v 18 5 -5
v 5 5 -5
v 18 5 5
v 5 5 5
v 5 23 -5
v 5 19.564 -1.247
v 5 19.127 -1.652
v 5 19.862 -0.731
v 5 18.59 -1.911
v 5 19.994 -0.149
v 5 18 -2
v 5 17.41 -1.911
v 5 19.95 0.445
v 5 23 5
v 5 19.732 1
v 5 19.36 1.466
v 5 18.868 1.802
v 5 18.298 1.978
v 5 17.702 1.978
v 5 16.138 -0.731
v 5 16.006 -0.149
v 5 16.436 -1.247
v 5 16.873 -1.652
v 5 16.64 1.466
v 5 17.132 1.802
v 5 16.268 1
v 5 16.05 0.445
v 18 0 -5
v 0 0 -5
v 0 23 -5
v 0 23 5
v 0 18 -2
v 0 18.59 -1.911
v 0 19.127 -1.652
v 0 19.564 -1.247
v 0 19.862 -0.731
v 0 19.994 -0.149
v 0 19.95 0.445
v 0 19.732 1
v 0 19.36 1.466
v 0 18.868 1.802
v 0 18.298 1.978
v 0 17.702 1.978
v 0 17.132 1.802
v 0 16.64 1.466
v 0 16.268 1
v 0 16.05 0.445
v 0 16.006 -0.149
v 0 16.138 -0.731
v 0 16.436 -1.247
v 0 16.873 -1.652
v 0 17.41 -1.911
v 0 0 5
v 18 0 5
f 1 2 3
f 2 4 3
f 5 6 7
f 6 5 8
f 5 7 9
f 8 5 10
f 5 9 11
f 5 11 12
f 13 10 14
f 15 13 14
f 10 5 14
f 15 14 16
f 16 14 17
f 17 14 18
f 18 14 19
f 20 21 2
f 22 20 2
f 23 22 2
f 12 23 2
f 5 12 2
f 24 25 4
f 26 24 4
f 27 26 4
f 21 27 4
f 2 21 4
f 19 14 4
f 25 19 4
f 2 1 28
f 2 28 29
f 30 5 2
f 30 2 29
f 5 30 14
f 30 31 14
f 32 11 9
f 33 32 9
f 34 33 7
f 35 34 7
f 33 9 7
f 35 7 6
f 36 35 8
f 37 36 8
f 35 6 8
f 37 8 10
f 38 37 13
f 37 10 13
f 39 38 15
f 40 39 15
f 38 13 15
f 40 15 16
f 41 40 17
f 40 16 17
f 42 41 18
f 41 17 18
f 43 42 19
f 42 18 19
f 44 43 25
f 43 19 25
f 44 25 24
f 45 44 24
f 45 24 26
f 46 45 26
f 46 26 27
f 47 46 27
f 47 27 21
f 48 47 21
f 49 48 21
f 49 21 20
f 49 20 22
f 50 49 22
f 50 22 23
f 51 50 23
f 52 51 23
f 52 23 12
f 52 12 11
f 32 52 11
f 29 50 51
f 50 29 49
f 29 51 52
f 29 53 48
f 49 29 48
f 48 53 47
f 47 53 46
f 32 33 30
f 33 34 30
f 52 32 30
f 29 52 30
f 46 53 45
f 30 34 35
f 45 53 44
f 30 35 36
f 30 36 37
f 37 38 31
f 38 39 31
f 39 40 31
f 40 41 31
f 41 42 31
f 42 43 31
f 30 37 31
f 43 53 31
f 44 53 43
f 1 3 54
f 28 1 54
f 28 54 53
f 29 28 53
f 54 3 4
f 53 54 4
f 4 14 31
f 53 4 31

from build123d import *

# Parameters (mm, degrees)
SALIENTE_EXTRUIR1_DEPTH = 5
CROQUIS2_R              = 2
CORTAR_EXTRUIR1_DEPTH   = 27.888659319


with BuildPart() as part:
    # Croquis1 → Saliente-Extruir1 (new, symmetric)
    with BuildSketch(Plane.XY):
        Polygon((0, 0), (0, 23), (5, 23), (5, 5), (18, 5), (18, 0), align=None)
    extrude(amount=SALIENTE_EXTRUIR1_DEPTH, both=True)

    # Croquis2 → Cortar-Extruir1 (cut, through all)
    with BuildSketch(Plane(origin=(5, 0, 0), x_dir=(0, 0, -1), z_dir=(1, 0, 0))):
        with Locations((0, 18)):
            Circle(CROQUIS2_R)
    extrude(amount=-CORTAR_EXTRUIR1_DEPTH, mode=Mode.SUBTRACT)


solid = part.part
